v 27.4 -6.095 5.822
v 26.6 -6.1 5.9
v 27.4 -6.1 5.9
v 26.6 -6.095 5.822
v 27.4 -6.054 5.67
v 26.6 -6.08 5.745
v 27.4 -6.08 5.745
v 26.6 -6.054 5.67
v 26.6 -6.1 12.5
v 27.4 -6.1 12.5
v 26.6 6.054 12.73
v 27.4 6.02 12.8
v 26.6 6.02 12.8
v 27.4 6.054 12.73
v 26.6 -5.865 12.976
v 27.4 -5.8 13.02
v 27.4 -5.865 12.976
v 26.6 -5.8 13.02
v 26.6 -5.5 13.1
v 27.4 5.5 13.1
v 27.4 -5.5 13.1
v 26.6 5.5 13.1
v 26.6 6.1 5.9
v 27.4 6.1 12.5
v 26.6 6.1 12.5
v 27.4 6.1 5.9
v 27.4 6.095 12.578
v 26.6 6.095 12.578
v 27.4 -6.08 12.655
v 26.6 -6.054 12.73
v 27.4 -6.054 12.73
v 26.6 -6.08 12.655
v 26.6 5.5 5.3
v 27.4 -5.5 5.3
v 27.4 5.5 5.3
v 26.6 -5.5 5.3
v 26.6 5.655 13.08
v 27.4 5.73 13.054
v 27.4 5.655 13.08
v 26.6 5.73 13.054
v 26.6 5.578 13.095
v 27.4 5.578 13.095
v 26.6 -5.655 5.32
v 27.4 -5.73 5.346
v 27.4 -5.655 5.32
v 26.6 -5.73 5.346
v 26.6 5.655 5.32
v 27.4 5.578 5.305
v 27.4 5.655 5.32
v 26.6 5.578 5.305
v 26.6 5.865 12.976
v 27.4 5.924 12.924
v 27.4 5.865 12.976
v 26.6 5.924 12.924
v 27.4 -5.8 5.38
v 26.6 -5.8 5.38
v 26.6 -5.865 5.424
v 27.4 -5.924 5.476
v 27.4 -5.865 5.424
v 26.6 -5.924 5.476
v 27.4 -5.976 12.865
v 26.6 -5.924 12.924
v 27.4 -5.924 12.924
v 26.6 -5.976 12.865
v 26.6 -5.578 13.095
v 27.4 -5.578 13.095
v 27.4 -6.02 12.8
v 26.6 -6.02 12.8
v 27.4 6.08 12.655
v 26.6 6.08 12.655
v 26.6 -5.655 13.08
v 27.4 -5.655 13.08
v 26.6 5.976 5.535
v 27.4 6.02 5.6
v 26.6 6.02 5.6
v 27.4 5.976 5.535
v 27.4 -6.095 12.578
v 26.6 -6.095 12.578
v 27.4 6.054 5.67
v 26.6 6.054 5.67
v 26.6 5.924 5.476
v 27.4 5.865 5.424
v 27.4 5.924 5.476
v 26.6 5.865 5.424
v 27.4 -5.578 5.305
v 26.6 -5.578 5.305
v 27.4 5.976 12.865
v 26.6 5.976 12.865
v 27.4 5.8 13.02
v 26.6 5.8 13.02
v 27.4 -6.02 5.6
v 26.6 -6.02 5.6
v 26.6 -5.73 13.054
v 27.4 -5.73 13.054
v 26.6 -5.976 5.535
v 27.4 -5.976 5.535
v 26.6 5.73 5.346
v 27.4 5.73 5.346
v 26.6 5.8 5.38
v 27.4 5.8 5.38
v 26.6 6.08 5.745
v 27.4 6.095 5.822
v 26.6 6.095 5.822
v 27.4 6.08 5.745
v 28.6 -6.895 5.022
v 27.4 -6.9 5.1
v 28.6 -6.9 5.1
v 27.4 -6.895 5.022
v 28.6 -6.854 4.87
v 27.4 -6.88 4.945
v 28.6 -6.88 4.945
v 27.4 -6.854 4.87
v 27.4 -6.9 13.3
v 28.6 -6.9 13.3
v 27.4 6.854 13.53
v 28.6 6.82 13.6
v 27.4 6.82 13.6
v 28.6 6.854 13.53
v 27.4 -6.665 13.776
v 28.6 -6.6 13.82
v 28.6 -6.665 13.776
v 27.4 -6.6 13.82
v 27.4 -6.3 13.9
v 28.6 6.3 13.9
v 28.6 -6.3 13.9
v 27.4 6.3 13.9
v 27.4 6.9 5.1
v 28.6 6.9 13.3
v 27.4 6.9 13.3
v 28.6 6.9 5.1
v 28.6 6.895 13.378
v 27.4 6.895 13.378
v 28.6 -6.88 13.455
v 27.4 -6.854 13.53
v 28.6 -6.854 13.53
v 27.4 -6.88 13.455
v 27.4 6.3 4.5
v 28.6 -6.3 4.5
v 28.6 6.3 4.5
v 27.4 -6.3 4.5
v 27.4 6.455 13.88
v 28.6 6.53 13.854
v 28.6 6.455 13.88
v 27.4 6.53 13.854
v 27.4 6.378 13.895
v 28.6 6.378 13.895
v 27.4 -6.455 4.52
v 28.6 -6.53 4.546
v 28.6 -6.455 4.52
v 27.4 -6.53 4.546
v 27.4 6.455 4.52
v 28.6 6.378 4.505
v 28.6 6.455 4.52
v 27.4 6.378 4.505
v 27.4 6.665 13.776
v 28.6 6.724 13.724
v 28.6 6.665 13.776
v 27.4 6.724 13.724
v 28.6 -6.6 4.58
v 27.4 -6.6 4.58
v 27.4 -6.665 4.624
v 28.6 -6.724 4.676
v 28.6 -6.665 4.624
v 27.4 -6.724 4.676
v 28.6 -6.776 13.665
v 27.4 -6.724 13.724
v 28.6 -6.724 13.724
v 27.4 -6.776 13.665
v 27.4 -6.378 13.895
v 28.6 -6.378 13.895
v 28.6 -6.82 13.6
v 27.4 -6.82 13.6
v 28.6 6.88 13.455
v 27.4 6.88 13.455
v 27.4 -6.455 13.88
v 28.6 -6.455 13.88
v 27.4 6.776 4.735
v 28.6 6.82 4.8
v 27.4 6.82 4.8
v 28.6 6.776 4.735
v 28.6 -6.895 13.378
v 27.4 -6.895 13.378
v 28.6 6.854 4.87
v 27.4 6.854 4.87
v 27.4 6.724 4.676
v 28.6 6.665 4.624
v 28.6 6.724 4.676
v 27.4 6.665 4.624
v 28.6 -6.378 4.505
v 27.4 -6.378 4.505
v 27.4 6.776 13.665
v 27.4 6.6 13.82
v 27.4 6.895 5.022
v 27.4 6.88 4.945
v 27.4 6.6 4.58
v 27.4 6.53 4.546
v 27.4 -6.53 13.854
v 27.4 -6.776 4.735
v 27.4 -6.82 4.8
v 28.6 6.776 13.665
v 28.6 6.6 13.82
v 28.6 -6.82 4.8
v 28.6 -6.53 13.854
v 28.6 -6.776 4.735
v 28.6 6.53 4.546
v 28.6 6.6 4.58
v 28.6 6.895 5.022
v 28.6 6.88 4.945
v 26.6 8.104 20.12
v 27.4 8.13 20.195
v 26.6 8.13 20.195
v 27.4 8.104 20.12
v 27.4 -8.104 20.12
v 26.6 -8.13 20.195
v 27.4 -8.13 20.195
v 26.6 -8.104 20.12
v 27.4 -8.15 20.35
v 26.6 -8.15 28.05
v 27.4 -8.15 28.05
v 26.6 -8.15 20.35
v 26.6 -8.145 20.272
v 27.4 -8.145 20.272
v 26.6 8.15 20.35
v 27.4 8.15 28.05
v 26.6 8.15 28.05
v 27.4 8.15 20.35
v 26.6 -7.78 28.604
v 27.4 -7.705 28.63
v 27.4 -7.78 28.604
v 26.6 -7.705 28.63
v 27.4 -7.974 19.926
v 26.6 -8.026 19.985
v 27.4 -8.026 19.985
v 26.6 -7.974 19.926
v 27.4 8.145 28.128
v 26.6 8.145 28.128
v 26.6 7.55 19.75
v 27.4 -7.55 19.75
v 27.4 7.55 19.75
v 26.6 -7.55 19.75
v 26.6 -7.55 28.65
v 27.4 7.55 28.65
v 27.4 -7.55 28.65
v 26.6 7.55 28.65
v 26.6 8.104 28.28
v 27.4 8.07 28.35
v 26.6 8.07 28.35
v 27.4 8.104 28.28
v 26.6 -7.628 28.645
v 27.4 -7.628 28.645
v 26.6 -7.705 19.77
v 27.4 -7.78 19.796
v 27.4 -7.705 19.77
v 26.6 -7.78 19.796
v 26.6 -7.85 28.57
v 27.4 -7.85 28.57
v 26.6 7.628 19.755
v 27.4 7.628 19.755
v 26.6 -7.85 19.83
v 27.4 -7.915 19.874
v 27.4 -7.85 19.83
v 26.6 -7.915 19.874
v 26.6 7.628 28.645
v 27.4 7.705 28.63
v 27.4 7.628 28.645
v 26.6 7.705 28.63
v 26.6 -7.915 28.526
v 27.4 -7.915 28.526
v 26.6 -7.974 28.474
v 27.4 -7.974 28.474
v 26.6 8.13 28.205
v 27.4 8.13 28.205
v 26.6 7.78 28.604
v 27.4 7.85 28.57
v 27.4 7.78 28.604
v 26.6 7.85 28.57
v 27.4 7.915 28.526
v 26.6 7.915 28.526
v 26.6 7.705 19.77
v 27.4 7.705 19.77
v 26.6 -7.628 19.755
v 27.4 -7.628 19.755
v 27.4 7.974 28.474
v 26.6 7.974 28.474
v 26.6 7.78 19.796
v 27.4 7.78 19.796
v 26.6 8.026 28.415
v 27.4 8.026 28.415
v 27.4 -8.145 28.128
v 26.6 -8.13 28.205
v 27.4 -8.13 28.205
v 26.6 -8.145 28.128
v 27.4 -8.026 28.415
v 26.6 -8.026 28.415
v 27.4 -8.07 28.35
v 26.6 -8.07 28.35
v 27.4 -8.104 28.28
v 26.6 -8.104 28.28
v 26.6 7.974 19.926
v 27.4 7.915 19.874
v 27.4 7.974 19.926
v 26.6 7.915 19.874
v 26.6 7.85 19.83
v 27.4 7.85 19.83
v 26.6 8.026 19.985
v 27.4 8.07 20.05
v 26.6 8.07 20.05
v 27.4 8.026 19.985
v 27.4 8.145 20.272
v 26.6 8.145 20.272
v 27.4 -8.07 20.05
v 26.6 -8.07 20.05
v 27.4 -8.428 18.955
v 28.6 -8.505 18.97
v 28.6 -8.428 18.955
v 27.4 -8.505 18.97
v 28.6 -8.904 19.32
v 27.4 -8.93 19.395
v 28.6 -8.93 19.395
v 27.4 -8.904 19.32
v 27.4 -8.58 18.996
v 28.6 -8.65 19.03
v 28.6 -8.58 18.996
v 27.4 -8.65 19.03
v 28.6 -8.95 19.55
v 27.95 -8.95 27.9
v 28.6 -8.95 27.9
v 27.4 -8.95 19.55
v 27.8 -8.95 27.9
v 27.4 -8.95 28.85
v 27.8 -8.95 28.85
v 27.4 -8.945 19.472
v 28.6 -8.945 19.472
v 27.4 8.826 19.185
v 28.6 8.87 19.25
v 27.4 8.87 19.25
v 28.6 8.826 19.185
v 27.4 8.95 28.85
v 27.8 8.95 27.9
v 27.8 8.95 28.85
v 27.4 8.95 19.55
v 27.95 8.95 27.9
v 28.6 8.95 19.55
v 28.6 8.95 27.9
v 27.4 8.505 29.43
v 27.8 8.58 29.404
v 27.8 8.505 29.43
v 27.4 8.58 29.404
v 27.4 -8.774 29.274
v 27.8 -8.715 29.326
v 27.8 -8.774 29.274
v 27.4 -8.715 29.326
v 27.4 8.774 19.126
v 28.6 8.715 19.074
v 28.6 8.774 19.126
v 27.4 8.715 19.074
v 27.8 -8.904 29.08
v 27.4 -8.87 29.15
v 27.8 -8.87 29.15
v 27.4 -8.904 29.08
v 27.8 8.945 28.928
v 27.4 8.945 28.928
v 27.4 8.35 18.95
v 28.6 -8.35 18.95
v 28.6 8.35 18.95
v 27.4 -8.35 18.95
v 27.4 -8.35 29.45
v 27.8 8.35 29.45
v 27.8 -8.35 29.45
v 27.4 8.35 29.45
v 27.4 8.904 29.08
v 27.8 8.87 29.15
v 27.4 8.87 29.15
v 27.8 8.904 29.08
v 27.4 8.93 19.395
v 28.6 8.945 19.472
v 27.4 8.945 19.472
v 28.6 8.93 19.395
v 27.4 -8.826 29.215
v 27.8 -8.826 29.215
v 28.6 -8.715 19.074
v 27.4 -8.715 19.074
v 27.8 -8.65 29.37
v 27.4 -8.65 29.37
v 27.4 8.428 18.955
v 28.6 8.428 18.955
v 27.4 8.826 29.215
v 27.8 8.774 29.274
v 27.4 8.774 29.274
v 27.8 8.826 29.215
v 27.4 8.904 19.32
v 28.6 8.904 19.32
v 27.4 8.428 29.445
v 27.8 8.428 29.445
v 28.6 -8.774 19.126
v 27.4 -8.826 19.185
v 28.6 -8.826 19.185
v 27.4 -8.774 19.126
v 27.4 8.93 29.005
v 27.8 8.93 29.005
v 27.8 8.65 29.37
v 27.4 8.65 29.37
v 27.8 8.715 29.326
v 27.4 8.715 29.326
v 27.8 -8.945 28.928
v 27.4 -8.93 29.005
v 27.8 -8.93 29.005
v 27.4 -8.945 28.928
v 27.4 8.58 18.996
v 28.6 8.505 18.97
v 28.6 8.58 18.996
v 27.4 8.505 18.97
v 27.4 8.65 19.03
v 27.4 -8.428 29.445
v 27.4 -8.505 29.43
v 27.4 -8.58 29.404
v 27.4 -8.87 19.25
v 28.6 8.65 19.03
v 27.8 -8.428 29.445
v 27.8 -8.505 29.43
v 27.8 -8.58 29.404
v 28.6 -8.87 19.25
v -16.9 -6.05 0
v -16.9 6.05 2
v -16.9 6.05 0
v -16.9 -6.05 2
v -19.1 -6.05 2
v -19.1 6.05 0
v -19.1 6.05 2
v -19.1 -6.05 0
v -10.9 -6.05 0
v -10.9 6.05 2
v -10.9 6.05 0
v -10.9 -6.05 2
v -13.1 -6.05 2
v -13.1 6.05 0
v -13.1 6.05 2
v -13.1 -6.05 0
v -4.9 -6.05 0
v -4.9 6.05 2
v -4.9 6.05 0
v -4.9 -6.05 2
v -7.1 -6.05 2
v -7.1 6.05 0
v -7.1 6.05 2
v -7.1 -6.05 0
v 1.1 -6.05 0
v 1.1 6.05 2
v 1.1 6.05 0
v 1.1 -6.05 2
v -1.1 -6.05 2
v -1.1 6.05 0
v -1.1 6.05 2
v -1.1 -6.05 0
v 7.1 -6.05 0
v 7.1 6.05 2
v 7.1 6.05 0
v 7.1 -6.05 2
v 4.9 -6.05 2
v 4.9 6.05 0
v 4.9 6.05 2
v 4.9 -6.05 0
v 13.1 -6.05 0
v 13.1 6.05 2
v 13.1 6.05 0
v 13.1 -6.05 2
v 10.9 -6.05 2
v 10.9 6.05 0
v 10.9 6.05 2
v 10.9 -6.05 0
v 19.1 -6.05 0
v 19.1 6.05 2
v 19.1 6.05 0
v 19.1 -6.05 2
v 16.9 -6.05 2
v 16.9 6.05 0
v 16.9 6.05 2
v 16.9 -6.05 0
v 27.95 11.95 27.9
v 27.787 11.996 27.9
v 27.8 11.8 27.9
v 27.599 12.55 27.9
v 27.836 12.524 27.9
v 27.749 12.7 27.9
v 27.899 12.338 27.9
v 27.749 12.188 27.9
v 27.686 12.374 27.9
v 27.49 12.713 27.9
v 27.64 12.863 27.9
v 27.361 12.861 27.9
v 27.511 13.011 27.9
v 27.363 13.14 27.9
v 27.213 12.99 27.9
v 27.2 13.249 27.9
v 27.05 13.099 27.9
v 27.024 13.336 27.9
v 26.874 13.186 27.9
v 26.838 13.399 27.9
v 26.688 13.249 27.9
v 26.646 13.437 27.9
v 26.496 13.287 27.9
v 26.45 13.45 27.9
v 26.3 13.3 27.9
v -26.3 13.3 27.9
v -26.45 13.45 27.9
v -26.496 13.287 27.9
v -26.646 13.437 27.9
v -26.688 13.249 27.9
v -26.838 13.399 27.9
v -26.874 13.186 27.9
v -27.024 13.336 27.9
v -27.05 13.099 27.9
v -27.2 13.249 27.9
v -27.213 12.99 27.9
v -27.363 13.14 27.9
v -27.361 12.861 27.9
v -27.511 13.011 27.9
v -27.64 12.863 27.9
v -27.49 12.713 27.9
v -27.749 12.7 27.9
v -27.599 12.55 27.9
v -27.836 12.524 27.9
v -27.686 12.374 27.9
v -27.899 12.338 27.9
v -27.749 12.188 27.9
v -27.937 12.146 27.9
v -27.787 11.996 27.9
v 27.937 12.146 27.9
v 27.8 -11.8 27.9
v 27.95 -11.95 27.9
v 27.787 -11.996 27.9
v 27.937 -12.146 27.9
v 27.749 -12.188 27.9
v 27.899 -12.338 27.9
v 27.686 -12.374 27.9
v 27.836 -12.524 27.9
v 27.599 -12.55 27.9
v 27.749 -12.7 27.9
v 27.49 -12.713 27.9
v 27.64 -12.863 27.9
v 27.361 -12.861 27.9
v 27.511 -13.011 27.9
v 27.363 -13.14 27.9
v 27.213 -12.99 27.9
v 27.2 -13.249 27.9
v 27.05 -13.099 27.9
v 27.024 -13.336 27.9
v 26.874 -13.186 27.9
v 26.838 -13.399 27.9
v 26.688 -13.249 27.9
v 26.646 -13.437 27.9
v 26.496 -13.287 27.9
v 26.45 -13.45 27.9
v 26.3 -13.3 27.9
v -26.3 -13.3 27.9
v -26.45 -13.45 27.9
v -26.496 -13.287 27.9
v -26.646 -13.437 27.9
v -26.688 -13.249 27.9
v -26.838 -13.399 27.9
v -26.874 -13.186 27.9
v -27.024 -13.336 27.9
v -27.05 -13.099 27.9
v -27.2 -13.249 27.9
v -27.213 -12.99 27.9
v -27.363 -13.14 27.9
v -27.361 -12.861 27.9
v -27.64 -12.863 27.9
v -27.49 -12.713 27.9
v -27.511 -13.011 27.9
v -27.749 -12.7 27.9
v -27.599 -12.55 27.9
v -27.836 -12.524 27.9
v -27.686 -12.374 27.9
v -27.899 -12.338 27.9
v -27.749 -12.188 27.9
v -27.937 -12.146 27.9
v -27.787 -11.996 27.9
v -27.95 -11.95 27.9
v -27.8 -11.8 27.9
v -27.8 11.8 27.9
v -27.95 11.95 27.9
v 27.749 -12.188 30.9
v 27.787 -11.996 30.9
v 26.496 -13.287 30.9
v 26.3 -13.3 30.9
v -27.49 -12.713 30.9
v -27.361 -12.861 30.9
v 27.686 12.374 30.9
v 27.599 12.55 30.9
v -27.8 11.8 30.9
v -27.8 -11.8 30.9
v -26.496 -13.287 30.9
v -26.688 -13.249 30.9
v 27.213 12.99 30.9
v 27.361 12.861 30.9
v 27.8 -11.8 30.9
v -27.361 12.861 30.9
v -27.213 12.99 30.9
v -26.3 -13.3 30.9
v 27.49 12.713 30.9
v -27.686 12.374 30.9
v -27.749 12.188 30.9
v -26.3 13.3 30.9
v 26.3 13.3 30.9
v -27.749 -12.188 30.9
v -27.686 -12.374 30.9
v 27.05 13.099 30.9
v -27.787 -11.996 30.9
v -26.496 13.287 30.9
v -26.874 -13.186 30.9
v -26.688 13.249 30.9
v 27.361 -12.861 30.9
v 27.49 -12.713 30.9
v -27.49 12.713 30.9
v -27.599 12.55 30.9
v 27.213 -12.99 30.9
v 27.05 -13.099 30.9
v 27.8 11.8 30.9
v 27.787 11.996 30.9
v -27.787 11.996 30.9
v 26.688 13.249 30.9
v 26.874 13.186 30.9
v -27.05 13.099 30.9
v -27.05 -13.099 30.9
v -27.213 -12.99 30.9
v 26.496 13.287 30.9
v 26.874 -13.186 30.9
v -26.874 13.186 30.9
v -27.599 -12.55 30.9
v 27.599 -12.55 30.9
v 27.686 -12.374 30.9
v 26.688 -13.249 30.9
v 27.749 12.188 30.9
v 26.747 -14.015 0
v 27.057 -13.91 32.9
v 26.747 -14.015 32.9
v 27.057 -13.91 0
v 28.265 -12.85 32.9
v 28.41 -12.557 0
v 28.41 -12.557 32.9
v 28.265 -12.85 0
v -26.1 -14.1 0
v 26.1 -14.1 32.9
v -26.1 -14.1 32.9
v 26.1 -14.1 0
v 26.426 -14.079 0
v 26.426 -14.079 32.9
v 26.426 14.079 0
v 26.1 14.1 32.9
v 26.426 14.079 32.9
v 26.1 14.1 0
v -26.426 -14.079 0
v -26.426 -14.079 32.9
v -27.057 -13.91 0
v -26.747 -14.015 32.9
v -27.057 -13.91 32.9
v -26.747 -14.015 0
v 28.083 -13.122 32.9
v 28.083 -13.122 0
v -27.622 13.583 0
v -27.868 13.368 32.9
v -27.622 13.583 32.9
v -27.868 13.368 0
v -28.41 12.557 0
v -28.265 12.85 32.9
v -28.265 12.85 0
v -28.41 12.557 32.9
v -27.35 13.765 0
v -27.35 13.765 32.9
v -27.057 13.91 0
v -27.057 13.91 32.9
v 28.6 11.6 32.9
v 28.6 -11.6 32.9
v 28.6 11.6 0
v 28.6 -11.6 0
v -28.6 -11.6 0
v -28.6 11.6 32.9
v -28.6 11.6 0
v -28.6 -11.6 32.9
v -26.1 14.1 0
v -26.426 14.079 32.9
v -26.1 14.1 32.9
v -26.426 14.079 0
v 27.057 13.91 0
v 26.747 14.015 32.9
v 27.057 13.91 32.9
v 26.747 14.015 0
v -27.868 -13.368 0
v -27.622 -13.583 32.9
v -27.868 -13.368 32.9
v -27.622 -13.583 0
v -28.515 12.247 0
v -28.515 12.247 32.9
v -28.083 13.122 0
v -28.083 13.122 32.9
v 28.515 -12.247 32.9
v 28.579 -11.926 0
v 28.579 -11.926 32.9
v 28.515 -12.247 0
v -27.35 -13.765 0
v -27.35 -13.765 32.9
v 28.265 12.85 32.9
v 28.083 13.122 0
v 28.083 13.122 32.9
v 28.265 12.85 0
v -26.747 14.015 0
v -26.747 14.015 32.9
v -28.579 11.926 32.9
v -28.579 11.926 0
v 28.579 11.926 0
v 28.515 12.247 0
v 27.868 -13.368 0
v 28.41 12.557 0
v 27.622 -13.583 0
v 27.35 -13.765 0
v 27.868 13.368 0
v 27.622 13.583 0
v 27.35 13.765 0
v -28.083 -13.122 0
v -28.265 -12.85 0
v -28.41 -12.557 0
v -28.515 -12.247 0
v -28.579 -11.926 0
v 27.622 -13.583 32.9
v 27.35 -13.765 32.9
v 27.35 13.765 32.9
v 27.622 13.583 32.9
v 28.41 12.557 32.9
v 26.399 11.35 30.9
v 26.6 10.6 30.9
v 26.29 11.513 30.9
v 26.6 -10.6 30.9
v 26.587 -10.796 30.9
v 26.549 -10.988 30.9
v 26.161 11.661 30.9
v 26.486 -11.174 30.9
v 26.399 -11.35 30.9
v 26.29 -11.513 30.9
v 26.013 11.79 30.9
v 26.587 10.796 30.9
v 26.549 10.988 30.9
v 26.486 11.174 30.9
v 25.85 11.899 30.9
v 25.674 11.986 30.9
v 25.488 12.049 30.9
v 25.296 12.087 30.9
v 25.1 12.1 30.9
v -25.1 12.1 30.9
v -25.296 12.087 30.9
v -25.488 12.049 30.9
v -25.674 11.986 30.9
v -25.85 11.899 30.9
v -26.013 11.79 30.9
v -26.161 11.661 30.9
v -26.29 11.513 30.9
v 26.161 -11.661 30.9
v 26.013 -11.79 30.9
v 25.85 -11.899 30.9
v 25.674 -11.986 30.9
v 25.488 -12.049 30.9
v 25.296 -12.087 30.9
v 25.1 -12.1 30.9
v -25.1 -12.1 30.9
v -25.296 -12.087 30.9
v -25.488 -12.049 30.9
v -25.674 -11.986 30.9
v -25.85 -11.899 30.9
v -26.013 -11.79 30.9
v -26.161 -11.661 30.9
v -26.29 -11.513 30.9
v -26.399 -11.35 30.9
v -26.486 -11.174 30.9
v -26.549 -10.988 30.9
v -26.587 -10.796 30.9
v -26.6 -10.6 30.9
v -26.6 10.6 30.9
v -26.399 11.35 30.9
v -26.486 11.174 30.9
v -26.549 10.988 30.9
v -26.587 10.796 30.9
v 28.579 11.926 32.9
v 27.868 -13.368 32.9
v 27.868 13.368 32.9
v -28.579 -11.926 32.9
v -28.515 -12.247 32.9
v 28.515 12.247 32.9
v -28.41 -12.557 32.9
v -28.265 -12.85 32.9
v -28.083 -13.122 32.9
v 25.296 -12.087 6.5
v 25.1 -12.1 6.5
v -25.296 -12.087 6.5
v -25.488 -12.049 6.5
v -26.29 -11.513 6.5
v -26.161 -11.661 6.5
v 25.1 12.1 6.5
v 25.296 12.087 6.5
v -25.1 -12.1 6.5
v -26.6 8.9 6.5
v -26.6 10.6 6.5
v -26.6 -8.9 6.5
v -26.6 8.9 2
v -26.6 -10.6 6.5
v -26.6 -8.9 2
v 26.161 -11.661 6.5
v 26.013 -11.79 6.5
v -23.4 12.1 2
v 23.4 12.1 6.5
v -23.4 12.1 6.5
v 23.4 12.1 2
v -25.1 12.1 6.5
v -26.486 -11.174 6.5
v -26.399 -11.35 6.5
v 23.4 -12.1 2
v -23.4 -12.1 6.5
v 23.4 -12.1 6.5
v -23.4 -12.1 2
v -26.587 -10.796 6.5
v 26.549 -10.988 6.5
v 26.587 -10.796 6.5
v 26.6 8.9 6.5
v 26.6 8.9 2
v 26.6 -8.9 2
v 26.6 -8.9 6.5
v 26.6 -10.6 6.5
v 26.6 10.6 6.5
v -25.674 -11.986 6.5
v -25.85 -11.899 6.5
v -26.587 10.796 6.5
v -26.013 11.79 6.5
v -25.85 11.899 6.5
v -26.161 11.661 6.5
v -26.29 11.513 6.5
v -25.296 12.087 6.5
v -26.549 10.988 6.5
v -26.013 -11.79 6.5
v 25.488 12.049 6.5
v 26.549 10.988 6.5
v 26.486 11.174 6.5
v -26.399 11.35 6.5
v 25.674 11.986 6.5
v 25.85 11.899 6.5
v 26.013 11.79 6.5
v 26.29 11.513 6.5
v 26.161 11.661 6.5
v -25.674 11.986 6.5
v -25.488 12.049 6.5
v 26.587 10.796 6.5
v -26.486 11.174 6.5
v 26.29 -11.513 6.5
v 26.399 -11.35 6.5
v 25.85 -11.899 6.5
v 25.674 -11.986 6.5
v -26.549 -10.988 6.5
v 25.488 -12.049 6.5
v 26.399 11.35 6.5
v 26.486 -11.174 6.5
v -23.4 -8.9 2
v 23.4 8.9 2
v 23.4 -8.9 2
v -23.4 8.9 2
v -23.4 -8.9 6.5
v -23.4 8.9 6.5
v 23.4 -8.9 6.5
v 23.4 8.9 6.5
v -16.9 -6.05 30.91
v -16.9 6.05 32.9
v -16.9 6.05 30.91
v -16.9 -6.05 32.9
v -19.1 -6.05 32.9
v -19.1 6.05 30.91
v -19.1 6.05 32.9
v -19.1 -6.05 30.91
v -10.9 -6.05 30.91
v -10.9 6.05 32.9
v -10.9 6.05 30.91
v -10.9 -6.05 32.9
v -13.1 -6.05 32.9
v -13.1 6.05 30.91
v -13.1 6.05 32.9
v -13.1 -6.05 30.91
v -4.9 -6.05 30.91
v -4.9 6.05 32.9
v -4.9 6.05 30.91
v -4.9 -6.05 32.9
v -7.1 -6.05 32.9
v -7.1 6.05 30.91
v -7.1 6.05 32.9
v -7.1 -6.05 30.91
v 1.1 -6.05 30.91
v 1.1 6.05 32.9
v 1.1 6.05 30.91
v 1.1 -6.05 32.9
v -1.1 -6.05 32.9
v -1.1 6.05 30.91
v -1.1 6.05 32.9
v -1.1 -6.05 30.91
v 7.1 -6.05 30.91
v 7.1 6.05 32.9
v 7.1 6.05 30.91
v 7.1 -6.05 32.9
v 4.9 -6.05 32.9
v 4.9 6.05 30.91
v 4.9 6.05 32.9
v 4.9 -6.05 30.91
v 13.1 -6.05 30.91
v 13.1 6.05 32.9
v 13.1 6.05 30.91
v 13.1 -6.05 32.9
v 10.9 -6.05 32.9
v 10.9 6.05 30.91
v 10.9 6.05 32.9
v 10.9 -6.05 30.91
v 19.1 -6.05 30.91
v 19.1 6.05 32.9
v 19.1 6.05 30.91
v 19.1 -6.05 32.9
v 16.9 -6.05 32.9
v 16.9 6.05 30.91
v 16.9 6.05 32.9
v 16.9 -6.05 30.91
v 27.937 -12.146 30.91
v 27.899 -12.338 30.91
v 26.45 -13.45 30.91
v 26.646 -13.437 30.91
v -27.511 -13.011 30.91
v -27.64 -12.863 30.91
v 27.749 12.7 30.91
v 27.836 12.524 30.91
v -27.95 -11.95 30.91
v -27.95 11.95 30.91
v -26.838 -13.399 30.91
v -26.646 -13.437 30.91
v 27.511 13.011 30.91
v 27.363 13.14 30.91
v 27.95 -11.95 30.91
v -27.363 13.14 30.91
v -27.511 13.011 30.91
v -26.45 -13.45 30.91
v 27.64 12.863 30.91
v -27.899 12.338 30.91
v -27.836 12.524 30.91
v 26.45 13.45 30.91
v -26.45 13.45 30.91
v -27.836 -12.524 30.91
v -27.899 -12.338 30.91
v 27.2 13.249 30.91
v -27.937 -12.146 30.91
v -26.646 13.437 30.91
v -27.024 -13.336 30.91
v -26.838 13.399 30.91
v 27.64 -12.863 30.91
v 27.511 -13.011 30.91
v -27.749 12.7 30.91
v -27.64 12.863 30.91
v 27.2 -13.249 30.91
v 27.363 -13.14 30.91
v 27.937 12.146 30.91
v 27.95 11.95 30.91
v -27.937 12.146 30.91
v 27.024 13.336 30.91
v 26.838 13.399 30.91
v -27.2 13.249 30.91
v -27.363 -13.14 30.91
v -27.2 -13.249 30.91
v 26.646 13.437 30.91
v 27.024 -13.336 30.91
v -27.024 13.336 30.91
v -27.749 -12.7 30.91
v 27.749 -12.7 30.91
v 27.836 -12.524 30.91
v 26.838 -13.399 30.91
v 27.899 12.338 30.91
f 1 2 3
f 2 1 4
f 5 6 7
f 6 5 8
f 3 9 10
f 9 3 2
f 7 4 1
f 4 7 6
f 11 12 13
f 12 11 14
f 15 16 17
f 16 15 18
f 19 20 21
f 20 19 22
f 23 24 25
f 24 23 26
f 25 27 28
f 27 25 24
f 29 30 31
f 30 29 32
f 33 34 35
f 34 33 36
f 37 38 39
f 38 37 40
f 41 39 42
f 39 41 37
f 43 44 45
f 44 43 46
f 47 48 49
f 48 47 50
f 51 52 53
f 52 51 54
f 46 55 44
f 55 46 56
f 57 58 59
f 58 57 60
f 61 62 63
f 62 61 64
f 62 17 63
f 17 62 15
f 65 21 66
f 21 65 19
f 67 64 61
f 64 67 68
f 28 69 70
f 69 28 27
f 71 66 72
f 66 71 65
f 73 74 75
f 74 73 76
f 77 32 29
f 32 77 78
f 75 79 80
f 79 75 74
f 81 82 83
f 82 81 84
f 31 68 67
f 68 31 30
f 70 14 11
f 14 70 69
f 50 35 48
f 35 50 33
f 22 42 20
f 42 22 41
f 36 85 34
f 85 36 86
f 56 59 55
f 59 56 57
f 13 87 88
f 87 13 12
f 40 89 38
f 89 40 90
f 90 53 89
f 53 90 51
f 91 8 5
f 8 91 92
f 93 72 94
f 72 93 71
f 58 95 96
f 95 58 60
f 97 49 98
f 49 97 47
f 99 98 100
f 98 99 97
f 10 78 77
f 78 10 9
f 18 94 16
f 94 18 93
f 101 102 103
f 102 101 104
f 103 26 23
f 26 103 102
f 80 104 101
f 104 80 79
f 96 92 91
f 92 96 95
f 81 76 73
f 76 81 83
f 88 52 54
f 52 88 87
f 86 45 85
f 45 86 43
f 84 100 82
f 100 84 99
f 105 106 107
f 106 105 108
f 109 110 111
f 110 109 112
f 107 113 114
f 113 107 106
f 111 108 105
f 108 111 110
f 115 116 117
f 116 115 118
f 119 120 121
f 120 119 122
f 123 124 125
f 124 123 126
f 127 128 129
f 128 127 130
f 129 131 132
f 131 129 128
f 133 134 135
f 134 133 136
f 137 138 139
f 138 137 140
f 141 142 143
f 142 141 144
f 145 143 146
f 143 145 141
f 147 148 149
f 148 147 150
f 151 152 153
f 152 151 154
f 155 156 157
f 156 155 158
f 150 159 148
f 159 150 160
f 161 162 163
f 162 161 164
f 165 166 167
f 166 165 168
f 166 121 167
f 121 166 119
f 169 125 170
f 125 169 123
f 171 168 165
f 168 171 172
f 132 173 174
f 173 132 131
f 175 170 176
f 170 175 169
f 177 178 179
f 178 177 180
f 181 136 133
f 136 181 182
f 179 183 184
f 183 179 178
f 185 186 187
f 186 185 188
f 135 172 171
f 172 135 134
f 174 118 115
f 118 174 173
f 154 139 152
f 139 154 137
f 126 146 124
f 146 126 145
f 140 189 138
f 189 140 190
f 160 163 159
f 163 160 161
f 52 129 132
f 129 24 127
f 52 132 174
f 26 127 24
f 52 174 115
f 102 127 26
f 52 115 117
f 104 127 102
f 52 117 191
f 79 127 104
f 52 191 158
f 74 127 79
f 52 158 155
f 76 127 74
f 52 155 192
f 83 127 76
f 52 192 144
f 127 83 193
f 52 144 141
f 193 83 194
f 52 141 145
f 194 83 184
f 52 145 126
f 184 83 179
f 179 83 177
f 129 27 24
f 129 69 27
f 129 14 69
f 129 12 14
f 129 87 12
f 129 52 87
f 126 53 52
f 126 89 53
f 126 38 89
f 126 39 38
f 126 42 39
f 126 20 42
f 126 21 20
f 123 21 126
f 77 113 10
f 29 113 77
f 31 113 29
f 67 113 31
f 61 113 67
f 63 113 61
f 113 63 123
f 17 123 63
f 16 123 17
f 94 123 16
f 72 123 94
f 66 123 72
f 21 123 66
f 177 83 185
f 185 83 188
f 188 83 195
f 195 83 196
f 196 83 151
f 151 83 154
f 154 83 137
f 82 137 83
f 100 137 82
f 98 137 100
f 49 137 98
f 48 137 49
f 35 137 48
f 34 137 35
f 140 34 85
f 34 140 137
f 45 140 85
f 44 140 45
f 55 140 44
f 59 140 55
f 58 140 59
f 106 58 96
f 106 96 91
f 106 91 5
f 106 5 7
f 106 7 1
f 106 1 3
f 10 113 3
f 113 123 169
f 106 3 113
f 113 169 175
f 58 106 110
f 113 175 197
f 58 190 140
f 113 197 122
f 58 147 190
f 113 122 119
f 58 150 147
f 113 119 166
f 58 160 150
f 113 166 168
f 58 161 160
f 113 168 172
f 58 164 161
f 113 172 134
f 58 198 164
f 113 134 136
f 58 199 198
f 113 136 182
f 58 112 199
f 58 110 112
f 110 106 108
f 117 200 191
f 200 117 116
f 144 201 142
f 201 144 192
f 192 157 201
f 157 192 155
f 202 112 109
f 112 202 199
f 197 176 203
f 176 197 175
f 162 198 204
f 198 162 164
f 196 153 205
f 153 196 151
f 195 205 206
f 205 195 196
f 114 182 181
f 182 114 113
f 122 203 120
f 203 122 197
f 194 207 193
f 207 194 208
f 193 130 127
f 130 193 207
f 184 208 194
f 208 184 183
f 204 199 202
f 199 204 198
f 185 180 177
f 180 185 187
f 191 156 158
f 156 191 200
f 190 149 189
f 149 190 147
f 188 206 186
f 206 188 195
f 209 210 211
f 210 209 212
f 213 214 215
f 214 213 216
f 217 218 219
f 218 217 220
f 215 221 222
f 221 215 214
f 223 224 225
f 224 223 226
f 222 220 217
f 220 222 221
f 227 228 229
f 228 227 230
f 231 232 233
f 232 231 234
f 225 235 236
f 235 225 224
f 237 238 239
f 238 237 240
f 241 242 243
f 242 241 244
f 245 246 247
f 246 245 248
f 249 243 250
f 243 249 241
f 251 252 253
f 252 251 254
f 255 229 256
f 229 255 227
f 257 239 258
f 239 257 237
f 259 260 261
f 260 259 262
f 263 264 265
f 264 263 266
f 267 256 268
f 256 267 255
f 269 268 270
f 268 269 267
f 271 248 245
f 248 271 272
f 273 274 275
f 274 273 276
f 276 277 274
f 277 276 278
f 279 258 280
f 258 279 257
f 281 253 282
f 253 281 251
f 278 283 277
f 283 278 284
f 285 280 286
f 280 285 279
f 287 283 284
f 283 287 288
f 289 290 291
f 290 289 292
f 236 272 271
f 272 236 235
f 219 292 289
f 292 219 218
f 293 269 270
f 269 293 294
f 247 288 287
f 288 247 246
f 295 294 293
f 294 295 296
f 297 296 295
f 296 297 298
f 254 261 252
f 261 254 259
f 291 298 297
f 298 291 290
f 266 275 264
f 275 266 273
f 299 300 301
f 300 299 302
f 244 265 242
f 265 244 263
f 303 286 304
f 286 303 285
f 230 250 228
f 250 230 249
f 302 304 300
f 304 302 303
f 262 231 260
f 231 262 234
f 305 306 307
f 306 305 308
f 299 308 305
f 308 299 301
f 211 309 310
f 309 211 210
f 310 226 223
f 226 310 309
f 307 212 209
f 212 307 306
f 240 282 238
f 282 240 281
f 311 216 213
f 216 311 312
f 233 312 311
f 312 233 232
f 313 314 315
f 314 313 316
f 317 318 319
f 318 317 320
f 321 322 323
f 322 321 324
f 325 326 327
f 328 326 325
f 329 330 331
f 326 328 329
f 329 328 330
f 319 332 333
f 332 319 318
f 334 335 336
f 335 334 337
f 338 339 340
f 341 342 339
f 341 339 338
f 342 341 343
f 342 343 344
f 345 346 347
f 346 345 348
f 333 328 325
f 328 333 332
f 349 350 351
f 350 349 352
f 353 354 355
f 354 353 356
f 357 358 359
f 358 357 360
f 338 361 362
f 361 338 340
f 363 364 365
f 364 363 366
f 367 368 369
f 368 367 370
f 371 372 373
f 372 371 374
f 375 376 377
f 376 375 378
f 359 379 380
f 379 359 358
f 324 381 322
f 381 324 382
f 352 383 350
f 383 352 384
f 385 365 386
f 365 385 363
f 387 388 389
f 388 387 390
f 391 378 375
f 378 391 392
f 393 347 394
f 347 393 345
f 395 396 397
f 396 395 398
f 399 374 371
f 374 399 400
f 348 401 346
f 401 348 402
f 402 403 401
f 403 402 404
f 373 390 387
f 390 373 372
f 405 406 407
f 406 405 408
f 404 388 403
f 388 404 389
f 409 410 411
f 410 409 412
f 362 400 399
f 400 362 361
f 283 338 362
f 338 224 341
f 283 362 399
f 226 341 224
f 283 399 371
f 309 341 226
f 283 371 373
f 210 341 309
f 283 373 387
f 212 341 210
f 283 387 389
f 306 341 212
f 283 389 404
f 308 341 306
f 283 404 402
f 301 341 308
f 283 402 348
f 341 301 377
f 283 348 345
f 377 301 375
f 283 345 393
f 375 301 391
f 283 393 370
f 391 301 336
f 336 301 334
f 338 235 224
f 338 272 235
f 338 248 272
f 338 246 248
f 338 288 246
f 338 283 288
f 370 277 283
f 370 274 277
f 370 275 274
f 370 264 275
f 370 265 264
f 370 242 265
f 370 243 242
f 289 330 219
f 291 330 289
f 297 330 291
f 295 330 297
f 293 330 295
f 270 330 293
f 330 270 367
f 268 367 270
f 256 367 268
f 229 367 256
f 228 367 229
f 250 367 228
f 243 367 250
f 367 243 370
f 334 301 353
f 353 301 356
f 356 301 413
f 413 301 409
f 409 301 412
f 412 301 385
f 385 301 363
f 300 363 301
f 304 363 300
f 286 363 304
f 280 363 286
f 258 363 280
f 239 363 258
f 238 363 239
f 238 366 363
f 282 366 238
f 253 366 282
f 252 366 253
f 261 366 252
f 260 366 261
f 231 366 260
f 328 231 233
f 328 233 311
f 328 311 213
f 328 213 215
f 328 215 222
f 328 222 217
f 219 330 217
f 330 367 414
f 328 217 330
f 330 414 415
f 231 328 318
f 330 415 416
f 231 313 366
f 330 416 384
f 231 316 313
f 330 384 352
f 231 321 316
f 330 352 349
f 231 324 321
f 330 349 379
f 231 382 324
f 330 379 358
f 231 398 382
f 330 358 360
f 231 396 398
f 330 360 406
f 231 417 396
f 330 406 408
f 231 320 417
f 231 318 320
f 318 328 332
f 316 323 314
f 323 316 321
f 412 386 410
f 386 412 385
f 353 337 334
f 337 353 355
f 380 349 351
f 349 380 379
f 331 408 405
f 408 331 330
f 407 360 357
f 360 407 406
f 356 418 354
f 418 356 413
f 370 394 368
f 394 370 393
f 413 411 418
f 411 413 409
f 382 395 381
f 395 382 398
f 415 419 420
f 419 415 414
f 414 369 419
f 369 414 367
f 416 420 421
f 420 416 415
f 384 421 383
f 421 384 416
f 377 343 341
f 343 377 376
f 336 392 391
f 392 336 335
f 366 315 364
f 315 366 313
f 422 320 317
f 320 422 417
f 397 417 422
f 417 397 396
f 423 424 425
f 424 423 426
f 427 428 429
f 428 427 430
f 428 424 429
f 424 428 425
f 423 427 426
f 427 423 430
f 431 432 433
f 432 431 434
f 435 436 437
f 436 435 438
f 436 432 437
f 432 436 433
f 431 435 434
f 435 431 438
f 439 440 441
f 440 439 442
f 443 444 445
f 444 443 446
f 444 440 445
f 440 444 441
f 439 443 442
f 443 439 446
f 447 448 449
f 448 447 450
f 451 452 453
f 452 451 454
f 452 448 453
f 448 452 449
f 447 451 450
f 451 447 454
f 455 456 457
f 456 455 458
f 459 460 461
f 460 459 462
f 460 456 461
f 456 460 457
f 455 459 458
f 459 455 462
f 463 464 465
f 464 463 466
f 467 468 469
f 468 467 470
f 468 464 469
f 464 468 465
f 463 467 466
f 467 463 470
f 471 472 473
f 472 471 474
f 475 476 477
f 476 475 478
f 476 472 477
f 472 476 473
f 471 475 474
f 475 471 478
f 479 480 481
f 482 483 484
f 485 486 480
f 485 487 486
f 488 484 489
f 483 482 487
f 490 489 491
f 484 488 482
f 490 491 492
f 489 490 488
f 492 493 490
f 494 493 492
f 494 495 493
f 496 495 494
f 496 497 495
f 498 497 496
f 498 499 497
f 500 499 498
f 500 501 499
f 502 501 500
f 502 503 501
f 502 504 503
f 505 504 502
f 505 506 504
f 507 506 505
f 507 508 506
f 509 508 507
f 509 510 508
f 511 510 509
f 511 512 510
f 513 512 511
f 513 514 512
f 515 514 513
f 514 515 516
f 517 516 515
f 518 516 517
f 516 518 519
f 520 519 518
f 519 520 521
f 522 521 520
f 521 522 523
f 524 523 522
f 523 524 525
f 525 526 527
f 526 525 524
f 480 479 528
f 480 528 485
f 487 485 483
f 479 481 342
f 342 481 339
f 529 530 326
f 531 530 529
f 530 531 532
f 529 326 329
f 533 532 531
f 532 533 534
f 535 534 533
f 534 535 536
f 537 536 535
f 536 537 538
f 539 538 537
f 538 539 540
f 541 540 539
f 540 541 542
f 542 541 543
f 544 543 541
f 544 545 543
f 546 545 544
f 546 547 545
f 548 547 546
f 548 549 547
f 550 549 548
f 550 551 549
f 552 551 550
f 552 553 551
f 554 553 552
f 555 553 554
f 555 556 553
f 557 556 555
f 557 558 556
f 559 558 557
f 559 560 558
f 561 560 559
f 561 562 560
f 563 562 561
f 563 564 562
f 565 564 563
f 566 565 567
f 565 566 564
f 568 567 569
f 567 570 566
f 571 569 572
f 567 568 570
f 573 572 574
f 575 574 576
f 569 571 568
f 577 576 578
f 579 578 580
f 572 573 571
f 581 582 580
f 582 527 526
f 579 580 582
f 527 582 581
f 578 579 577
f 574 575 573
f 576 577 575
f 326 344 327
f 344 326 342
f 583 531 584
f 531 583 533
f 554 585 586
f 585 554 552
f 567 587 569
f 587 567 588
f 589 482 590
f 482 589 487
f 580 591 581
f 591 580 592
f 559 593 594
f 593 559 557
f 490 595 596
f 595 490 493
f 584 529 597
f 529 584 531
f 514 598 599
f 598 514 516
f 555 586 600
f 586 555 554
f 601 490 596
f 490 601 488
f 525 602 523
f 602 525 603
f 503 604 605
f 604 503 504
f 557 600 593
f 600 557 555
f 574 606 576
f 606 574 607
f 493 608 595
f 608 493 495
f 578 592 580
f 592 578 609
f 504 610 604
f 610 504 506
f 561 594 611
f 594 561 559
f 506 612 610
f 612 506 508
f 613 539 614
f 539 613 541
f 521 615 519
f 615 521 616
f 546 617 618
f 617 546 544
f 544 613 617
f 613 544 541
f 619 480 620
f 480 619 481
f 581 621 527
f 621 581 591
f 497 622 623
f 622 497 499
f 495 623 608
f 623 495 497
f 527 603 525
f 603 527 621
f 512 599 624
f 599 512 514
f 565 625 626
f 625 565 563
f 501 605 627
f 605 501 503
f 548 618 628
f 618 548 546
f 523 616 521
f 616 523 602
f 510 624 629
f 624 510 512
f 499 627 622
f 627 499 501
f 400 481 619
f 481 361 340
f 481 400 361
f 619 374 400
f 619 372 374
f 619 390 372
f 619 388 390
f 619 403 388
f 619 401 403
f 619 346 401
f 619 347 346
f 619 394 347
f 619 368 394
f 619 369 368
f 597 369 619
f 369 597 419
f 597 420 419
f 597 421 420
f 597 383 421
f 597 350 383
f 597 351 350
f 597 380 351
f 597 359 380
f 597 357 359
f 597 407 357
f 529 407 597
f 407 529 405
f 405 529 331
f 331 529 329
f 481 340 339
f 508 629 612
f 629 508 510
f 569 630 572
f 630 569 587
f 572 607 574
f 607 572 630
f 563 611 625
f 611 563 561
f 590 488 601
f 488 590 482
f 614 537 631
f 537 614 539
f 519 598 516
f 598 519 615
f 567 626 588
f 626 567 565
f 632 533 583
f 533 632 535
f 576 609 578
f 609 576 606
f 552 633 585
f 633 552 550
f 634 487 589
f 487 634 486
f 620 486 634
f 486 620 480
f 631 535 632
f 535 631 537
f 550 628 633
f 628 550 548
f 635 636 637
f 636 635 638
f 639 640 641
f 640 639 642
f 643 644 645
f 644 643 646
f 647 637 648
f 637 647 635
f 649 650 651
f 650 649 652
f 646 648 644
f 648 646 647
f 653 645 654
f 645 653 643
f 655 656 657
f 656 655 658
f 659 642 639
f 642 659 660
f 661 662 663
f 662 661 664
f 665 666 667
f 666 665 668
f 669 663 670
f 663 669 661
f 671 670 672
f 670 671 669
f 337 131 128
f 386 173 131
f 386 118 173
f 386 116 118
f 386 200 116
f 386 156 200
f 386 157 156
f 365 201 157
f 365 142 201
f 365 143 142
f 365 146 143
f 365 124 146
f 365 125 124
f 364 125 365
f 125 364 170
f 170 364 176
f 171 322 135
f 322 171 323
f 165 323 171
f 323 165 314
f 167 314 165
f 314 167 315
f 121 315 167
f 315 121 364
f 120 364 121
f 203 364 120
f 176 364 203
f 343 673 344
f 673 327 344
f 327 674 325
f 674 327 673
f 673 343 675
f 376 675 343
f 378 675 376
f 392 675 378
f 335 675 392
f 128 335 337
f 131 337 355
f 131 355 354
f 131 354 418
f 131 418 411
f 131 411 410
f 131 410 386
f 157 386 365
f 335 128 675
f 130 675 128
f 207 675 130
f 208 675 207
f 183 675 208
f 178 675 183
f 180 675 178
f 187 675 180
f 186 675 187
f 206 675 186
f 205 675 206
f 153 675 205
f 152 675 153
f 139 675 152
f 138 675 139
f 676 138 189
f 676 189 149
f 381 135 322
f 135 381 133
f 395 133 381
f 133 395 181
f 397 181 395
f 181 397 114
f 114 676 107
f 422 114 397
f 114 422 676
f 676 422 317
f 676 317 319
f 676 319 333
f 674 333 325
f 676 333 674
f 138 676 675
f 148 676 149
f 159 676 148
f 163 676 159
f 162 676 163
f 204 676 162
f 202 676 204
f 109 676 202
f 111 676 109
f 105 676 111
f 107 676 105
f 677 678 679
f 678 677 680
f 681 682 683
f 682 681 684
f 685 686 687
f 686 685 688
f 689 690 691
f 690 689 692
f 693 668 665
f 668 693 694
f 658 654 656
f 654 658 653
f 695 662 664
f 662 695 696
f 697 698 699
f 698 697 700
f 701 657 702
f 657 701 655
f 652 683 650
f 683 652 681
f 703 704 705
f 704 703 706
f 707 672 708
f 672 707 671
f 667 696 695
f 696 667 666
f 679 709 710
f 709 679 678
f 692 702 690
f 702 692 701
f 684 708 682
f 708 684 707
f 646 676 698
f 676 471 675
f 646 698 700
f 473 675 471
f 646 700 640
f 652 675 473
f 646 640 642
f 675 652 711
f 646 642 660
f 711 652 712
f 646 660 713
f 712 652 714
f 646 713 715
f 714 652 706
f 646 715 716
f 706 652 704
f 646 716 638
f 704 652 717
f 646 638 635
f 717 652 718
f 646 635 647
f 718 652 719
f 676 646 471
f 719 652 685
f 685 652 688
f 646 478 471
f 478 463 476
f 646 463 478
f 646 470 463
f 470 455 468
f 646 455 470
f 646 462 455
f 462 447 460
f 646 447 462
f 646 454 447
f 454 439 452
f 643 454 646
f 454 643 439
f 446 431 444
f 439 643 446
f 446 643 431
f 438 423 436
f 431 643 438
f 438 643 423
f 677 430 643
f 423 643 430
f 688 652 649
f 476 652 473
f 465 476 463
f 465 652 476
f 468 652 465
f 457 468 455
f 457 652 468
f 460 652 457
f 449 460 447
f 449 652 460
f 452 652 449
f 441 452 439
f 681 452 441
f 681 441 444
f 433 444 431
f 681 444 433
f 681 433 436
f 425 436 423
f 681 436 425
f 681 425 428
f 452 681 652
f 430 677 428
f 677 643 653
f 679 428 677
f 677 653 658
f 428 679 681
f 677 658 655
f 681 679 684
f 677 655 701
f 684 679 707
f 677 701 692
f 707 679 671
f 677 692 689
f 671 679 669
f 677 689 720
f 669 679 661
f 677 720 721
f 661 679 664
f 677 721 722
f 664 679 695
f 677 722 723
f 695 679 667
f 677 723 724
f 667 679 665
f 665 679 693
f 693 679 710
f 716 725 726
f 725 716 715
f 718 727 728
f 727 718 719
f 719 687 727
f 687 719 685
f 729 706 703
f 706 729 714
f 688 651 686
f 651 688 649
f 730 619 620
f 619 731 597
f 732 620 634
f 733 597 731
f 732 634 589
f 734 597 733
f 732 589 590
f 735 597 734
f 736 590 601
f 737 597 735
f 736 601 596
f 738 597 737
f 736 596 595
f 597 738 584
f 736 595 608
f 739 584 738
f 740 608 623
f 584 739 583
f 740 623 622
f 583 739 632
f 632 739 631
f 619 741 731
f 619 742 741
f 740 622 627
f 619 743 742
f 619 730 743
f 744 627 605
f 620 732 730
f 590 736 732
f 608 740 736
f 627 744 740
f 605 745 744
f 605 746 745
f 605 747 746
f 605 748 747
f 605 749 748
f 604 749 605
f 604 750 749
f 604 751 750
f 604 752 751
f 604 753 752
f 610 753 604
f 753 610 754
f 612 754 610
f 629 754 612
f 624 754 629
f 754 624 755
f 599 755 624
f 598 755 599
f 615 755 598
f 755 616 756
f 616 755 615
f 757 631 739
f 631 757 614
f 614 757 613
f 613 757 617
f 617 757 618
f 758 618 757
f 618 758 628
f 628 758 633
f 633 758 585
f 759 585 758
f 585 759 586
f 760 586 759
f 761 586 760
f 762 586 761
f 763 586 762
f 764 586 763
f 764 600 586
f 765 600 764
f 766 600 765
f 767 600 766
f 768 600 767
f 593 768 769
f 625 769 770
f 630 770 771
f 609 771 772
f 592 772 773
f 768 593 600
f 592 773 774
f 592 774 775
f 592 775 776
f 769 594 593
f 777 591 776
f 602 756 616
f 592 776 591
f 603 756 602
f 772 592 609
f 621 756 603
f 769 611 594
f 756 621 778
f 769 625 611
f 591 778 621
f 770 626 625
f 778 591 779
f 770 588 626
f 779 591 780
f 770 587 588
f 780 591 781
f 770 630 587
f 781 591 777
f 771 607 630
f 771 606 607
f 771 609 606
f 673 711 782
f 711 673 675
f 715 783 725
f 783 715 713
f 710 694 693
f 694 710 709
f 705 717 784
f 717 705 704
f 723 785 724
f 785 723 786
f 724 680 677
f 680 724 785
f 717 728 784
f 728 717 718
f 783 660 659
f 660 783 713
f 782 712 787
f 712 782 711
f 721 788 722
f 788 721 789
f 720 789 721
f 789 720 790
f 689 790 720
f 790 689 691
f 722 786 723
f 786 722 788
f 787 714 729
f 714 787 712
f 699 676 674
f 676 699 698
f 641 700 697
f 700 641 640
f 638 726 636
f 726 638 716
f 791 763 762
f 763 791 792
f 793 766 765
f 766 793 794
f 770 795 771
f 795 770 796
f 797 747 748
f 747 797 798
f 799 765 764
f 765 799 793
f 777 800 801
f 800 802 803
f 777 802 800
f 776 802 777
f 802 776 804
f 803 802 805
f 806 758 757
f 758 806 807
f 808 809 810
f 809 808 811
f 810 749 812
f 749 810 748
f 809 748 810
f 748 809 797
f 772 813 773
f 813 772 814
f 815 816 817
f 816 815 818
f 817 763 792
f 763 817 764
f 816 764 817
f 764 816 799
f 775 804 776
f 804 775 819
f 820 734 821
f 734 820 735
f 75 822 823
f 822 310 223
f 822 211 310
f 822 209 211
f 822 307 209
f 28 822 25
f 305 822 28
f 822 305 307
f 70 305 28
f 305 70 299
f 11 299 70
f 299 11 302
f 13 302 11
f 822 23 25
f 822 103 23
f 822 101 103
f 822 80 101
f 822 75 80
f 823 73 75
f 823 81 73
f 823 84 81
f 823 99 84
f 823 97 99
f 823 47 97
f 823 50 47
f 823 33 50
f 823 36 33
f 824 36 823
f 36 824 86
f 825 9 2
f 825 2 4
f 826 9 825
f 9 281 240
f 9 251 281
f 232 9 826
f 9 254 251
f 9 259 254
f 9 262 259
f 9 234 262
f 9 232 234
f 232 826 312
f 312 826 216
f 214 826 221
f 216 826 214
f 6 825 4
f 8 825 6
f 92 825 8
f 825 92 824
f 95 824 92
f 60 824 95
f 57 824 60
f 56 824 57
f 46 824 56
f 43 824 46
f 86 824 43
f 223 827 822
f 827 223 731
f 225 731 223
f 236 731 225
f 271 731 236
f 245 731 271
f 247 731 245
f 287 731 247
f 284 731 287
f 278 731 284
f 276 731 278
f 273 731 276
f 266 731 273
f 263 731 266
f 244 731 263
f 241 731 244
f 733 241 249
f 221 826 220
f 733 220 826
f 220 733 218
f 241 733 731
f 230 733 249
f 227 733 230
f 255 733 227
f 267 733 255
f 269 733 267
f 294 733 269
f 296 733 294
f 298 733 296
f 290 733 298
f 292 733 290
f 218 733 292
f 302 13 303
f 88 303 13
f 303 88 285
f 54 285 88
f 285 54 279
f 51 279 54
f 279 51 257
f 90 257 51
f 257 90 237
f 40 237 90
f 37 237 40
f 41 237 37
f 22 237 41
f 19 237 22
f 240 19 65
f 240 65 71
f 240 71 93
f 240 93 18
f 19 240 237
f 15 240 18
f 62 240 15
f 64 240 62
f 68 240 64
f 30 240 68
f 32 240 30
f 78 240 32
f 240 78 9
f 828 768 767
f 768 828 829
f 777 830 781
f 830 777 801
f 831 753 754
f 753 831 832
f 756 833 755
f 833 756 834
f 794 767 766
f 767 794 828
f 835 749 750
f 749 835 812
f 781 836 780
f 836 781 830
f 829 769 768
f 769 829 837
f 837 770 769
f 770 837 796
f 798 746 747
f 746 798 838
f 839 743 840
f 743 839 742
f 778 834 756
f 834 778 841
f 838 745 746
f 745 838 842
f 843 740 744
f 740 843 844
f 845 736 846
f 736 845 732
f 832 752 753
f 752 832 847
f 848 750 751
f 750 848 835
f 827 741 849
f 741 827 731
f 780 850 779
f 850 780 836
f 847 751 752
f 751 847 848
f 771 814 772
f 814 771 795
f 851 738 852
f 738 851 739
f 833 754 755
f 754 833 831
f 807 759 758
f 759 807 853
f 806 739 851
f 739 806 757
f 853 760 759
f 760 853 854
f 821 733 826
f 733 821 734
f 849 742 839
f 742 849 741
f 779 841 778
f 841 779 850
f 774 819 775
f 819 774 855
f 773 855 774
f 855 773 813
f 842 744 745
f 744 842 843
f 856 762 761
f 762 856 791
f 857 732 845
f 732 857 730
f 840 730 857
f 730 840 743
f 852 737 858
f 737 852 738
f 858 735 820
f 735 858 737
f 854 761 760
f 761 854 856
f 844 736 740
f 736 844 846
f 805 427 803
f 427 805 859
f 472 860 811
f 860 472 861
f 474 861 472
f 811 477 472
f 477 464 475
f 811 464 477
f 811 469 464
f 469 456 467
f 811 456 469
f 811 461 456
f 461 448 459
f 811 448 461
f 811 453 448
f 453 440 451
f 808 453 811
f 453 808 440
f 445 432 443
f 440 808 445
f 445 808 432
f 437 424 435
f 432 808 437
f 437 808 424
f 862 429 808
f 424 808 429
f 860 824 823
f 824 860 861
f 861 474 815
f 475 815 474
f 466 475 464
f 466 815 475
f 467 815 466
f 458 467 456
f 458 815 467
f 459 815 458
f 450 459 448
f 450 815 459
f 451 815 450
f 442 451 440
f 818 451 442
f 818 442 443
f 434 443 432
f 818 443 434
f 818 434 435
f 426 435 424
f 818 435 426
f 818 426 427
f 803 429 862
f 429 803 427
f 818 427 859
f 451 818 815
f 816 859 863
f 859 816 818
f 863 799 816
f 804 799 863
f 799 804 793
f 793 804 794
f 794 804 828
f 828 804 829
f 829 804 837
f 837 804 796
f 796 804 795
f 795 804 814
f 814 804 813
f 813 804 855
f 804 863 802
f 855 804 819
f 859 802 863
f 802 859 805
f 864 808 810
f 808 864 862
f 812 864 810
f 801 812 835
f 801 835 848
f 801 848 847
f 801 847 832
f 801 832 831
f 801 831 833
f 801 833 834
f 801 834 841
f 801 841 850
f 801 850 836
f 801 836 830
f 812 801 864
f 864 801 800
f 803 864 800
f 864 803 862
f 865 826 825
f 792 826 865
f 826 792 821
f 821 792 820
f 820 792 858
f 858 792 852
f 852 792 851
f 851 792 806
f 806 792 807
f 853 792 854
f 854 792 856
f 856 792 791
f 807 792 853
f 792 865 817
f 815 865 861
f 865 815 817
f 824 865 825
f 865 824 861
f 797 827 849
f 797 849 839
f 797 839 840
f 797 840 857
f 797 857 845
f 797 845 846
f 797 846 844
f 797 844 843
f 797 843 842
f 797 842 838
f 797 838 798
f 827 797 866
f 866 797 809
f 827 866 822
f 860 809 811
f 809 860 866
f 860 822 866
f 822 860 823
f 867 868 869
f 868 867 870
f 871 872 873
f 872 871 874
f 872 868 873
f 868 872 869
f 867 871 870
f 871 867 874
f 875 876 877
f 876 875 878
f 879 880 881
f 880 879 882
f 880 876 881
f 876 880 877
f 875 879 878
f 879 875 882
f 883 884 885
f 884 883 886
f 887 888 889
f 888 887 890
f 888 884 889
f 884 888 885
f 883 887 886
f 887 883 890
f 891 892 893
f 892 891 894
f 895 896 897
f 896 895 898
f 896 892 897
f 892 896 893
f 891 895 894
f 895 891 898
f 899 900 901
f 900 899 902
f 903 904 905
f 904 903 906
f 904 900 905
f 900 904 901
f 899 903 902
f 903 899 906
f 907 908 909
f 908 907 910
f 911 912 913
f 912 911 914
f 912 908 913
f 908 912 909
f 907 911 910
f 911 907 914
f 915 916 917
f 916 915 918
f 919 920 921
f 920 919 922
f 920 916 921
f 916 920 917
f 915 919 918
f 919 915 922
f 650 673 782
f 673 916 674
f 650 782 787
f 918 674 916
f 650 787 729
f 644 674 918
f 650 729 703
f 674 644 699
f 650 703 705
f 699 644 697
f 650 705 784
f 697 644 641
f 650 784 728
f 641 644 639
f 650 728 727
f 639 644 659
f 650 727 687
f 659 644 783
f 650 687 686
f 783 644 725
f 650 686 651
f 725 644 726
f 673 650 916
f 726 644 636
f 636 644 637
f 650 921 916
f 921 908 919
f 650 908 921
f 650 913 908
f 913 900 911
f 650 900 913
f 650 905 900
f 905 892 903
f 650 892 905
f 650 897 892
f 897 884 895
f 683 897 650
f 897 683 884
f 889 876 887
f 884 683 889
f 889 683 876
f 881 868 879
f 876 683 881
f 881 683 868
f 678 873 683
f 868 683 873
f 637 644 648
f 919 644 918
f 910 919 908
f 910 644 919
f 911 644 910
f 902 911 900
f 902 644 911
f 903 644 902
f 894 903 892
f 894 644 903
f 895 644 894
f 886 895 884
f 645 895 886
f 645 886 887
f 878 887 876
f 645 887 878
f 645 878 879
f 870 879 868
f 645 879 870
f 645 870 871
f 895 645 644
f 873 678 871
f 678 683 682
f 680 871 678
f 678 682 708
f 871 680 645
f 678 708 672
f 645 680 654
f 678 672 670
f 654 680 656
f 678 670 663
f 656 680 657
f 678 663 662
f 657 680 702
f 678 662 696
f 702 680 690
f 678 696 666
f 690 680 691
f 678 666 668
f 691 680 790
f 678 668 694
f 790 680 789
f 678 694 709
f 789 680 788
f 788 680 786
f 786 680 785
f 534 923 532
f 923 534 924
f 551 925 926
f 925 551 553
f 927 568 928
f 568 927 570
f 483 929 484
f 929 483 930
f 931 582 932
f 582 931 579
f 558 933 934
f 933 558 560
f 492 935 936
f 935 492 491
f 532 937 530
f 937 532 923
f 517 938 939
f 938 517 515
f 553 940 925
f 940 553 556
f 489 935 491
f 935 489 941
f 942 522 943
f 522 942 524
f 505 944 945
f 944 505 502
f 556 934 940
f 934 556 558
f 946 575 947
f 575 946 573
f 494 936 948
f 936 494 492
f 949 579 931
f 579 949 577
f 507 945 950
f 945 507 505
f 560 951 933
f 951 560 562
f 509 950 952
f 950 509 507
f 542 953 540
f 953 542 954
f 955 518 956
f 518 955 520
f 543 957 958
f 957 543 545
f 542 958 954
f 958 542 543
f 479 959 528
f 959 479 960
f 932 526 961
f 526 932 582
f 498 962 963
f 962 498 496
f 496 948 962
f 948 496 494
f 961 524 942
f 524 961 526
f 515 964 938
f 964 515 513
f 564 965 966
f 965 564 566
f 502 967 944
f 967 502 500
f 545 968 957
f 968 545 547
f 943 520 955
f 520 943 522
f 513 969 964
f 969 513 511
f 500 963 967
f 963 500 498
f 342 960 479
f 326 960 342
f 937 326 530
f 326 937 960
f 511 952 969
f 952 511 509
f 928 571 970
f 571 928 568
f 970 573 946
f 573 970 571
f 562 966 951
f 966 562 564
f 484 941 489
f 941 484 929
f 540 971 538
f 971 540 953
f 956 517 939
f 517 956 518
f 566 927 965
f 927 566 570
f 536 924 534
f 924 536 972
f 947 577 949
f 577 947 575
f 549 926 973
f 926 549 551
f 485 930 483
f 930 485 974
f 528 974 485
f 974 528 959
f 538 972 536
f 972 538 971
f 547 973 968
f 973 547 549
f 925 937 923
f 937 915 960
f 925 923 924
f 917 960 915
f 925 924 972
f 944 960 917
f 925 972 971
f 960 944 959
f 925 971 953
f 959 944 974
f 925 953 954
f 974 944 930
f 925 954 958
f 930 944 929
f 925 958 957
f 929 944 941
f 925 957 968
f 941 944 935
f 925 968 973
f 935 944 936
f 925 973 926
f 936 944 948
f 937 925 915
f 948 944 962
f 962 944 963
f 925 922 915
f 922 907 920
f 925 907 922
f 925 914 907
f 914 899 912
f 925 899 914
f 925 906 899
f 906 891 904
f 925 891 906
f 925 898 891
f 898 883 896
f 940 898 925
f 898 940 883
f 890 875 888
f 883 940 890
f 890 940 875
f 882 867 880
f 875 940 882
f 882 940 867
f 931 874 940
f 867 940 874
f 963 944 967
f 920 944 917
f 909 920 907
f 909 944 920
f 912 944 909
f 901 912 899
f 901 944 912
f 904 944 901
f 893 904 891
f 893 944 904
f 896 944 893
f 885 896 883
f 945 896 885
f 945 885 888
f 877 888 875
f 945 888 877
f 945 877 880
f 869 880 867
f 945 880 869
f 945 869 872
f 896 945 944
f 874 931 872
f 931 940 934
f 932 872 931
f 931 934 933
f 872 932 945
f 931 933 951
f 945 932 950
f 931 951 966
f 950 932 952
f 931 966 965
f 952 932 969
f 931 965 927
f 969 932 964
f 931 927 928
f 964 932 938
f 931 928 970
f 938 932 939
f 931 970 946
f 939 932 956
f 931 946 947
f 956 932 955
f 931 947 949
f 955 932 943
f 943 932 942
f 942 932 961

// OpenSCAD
// Assembly / exploded view. Not a printable part.
//   OpenSCAD -o out.png -D explode=1 assembly.scad
include <case.scad>;          // renders base() at the origin
explode = 0;
translate([0, 0, base_h + explode * 20]) lid();
